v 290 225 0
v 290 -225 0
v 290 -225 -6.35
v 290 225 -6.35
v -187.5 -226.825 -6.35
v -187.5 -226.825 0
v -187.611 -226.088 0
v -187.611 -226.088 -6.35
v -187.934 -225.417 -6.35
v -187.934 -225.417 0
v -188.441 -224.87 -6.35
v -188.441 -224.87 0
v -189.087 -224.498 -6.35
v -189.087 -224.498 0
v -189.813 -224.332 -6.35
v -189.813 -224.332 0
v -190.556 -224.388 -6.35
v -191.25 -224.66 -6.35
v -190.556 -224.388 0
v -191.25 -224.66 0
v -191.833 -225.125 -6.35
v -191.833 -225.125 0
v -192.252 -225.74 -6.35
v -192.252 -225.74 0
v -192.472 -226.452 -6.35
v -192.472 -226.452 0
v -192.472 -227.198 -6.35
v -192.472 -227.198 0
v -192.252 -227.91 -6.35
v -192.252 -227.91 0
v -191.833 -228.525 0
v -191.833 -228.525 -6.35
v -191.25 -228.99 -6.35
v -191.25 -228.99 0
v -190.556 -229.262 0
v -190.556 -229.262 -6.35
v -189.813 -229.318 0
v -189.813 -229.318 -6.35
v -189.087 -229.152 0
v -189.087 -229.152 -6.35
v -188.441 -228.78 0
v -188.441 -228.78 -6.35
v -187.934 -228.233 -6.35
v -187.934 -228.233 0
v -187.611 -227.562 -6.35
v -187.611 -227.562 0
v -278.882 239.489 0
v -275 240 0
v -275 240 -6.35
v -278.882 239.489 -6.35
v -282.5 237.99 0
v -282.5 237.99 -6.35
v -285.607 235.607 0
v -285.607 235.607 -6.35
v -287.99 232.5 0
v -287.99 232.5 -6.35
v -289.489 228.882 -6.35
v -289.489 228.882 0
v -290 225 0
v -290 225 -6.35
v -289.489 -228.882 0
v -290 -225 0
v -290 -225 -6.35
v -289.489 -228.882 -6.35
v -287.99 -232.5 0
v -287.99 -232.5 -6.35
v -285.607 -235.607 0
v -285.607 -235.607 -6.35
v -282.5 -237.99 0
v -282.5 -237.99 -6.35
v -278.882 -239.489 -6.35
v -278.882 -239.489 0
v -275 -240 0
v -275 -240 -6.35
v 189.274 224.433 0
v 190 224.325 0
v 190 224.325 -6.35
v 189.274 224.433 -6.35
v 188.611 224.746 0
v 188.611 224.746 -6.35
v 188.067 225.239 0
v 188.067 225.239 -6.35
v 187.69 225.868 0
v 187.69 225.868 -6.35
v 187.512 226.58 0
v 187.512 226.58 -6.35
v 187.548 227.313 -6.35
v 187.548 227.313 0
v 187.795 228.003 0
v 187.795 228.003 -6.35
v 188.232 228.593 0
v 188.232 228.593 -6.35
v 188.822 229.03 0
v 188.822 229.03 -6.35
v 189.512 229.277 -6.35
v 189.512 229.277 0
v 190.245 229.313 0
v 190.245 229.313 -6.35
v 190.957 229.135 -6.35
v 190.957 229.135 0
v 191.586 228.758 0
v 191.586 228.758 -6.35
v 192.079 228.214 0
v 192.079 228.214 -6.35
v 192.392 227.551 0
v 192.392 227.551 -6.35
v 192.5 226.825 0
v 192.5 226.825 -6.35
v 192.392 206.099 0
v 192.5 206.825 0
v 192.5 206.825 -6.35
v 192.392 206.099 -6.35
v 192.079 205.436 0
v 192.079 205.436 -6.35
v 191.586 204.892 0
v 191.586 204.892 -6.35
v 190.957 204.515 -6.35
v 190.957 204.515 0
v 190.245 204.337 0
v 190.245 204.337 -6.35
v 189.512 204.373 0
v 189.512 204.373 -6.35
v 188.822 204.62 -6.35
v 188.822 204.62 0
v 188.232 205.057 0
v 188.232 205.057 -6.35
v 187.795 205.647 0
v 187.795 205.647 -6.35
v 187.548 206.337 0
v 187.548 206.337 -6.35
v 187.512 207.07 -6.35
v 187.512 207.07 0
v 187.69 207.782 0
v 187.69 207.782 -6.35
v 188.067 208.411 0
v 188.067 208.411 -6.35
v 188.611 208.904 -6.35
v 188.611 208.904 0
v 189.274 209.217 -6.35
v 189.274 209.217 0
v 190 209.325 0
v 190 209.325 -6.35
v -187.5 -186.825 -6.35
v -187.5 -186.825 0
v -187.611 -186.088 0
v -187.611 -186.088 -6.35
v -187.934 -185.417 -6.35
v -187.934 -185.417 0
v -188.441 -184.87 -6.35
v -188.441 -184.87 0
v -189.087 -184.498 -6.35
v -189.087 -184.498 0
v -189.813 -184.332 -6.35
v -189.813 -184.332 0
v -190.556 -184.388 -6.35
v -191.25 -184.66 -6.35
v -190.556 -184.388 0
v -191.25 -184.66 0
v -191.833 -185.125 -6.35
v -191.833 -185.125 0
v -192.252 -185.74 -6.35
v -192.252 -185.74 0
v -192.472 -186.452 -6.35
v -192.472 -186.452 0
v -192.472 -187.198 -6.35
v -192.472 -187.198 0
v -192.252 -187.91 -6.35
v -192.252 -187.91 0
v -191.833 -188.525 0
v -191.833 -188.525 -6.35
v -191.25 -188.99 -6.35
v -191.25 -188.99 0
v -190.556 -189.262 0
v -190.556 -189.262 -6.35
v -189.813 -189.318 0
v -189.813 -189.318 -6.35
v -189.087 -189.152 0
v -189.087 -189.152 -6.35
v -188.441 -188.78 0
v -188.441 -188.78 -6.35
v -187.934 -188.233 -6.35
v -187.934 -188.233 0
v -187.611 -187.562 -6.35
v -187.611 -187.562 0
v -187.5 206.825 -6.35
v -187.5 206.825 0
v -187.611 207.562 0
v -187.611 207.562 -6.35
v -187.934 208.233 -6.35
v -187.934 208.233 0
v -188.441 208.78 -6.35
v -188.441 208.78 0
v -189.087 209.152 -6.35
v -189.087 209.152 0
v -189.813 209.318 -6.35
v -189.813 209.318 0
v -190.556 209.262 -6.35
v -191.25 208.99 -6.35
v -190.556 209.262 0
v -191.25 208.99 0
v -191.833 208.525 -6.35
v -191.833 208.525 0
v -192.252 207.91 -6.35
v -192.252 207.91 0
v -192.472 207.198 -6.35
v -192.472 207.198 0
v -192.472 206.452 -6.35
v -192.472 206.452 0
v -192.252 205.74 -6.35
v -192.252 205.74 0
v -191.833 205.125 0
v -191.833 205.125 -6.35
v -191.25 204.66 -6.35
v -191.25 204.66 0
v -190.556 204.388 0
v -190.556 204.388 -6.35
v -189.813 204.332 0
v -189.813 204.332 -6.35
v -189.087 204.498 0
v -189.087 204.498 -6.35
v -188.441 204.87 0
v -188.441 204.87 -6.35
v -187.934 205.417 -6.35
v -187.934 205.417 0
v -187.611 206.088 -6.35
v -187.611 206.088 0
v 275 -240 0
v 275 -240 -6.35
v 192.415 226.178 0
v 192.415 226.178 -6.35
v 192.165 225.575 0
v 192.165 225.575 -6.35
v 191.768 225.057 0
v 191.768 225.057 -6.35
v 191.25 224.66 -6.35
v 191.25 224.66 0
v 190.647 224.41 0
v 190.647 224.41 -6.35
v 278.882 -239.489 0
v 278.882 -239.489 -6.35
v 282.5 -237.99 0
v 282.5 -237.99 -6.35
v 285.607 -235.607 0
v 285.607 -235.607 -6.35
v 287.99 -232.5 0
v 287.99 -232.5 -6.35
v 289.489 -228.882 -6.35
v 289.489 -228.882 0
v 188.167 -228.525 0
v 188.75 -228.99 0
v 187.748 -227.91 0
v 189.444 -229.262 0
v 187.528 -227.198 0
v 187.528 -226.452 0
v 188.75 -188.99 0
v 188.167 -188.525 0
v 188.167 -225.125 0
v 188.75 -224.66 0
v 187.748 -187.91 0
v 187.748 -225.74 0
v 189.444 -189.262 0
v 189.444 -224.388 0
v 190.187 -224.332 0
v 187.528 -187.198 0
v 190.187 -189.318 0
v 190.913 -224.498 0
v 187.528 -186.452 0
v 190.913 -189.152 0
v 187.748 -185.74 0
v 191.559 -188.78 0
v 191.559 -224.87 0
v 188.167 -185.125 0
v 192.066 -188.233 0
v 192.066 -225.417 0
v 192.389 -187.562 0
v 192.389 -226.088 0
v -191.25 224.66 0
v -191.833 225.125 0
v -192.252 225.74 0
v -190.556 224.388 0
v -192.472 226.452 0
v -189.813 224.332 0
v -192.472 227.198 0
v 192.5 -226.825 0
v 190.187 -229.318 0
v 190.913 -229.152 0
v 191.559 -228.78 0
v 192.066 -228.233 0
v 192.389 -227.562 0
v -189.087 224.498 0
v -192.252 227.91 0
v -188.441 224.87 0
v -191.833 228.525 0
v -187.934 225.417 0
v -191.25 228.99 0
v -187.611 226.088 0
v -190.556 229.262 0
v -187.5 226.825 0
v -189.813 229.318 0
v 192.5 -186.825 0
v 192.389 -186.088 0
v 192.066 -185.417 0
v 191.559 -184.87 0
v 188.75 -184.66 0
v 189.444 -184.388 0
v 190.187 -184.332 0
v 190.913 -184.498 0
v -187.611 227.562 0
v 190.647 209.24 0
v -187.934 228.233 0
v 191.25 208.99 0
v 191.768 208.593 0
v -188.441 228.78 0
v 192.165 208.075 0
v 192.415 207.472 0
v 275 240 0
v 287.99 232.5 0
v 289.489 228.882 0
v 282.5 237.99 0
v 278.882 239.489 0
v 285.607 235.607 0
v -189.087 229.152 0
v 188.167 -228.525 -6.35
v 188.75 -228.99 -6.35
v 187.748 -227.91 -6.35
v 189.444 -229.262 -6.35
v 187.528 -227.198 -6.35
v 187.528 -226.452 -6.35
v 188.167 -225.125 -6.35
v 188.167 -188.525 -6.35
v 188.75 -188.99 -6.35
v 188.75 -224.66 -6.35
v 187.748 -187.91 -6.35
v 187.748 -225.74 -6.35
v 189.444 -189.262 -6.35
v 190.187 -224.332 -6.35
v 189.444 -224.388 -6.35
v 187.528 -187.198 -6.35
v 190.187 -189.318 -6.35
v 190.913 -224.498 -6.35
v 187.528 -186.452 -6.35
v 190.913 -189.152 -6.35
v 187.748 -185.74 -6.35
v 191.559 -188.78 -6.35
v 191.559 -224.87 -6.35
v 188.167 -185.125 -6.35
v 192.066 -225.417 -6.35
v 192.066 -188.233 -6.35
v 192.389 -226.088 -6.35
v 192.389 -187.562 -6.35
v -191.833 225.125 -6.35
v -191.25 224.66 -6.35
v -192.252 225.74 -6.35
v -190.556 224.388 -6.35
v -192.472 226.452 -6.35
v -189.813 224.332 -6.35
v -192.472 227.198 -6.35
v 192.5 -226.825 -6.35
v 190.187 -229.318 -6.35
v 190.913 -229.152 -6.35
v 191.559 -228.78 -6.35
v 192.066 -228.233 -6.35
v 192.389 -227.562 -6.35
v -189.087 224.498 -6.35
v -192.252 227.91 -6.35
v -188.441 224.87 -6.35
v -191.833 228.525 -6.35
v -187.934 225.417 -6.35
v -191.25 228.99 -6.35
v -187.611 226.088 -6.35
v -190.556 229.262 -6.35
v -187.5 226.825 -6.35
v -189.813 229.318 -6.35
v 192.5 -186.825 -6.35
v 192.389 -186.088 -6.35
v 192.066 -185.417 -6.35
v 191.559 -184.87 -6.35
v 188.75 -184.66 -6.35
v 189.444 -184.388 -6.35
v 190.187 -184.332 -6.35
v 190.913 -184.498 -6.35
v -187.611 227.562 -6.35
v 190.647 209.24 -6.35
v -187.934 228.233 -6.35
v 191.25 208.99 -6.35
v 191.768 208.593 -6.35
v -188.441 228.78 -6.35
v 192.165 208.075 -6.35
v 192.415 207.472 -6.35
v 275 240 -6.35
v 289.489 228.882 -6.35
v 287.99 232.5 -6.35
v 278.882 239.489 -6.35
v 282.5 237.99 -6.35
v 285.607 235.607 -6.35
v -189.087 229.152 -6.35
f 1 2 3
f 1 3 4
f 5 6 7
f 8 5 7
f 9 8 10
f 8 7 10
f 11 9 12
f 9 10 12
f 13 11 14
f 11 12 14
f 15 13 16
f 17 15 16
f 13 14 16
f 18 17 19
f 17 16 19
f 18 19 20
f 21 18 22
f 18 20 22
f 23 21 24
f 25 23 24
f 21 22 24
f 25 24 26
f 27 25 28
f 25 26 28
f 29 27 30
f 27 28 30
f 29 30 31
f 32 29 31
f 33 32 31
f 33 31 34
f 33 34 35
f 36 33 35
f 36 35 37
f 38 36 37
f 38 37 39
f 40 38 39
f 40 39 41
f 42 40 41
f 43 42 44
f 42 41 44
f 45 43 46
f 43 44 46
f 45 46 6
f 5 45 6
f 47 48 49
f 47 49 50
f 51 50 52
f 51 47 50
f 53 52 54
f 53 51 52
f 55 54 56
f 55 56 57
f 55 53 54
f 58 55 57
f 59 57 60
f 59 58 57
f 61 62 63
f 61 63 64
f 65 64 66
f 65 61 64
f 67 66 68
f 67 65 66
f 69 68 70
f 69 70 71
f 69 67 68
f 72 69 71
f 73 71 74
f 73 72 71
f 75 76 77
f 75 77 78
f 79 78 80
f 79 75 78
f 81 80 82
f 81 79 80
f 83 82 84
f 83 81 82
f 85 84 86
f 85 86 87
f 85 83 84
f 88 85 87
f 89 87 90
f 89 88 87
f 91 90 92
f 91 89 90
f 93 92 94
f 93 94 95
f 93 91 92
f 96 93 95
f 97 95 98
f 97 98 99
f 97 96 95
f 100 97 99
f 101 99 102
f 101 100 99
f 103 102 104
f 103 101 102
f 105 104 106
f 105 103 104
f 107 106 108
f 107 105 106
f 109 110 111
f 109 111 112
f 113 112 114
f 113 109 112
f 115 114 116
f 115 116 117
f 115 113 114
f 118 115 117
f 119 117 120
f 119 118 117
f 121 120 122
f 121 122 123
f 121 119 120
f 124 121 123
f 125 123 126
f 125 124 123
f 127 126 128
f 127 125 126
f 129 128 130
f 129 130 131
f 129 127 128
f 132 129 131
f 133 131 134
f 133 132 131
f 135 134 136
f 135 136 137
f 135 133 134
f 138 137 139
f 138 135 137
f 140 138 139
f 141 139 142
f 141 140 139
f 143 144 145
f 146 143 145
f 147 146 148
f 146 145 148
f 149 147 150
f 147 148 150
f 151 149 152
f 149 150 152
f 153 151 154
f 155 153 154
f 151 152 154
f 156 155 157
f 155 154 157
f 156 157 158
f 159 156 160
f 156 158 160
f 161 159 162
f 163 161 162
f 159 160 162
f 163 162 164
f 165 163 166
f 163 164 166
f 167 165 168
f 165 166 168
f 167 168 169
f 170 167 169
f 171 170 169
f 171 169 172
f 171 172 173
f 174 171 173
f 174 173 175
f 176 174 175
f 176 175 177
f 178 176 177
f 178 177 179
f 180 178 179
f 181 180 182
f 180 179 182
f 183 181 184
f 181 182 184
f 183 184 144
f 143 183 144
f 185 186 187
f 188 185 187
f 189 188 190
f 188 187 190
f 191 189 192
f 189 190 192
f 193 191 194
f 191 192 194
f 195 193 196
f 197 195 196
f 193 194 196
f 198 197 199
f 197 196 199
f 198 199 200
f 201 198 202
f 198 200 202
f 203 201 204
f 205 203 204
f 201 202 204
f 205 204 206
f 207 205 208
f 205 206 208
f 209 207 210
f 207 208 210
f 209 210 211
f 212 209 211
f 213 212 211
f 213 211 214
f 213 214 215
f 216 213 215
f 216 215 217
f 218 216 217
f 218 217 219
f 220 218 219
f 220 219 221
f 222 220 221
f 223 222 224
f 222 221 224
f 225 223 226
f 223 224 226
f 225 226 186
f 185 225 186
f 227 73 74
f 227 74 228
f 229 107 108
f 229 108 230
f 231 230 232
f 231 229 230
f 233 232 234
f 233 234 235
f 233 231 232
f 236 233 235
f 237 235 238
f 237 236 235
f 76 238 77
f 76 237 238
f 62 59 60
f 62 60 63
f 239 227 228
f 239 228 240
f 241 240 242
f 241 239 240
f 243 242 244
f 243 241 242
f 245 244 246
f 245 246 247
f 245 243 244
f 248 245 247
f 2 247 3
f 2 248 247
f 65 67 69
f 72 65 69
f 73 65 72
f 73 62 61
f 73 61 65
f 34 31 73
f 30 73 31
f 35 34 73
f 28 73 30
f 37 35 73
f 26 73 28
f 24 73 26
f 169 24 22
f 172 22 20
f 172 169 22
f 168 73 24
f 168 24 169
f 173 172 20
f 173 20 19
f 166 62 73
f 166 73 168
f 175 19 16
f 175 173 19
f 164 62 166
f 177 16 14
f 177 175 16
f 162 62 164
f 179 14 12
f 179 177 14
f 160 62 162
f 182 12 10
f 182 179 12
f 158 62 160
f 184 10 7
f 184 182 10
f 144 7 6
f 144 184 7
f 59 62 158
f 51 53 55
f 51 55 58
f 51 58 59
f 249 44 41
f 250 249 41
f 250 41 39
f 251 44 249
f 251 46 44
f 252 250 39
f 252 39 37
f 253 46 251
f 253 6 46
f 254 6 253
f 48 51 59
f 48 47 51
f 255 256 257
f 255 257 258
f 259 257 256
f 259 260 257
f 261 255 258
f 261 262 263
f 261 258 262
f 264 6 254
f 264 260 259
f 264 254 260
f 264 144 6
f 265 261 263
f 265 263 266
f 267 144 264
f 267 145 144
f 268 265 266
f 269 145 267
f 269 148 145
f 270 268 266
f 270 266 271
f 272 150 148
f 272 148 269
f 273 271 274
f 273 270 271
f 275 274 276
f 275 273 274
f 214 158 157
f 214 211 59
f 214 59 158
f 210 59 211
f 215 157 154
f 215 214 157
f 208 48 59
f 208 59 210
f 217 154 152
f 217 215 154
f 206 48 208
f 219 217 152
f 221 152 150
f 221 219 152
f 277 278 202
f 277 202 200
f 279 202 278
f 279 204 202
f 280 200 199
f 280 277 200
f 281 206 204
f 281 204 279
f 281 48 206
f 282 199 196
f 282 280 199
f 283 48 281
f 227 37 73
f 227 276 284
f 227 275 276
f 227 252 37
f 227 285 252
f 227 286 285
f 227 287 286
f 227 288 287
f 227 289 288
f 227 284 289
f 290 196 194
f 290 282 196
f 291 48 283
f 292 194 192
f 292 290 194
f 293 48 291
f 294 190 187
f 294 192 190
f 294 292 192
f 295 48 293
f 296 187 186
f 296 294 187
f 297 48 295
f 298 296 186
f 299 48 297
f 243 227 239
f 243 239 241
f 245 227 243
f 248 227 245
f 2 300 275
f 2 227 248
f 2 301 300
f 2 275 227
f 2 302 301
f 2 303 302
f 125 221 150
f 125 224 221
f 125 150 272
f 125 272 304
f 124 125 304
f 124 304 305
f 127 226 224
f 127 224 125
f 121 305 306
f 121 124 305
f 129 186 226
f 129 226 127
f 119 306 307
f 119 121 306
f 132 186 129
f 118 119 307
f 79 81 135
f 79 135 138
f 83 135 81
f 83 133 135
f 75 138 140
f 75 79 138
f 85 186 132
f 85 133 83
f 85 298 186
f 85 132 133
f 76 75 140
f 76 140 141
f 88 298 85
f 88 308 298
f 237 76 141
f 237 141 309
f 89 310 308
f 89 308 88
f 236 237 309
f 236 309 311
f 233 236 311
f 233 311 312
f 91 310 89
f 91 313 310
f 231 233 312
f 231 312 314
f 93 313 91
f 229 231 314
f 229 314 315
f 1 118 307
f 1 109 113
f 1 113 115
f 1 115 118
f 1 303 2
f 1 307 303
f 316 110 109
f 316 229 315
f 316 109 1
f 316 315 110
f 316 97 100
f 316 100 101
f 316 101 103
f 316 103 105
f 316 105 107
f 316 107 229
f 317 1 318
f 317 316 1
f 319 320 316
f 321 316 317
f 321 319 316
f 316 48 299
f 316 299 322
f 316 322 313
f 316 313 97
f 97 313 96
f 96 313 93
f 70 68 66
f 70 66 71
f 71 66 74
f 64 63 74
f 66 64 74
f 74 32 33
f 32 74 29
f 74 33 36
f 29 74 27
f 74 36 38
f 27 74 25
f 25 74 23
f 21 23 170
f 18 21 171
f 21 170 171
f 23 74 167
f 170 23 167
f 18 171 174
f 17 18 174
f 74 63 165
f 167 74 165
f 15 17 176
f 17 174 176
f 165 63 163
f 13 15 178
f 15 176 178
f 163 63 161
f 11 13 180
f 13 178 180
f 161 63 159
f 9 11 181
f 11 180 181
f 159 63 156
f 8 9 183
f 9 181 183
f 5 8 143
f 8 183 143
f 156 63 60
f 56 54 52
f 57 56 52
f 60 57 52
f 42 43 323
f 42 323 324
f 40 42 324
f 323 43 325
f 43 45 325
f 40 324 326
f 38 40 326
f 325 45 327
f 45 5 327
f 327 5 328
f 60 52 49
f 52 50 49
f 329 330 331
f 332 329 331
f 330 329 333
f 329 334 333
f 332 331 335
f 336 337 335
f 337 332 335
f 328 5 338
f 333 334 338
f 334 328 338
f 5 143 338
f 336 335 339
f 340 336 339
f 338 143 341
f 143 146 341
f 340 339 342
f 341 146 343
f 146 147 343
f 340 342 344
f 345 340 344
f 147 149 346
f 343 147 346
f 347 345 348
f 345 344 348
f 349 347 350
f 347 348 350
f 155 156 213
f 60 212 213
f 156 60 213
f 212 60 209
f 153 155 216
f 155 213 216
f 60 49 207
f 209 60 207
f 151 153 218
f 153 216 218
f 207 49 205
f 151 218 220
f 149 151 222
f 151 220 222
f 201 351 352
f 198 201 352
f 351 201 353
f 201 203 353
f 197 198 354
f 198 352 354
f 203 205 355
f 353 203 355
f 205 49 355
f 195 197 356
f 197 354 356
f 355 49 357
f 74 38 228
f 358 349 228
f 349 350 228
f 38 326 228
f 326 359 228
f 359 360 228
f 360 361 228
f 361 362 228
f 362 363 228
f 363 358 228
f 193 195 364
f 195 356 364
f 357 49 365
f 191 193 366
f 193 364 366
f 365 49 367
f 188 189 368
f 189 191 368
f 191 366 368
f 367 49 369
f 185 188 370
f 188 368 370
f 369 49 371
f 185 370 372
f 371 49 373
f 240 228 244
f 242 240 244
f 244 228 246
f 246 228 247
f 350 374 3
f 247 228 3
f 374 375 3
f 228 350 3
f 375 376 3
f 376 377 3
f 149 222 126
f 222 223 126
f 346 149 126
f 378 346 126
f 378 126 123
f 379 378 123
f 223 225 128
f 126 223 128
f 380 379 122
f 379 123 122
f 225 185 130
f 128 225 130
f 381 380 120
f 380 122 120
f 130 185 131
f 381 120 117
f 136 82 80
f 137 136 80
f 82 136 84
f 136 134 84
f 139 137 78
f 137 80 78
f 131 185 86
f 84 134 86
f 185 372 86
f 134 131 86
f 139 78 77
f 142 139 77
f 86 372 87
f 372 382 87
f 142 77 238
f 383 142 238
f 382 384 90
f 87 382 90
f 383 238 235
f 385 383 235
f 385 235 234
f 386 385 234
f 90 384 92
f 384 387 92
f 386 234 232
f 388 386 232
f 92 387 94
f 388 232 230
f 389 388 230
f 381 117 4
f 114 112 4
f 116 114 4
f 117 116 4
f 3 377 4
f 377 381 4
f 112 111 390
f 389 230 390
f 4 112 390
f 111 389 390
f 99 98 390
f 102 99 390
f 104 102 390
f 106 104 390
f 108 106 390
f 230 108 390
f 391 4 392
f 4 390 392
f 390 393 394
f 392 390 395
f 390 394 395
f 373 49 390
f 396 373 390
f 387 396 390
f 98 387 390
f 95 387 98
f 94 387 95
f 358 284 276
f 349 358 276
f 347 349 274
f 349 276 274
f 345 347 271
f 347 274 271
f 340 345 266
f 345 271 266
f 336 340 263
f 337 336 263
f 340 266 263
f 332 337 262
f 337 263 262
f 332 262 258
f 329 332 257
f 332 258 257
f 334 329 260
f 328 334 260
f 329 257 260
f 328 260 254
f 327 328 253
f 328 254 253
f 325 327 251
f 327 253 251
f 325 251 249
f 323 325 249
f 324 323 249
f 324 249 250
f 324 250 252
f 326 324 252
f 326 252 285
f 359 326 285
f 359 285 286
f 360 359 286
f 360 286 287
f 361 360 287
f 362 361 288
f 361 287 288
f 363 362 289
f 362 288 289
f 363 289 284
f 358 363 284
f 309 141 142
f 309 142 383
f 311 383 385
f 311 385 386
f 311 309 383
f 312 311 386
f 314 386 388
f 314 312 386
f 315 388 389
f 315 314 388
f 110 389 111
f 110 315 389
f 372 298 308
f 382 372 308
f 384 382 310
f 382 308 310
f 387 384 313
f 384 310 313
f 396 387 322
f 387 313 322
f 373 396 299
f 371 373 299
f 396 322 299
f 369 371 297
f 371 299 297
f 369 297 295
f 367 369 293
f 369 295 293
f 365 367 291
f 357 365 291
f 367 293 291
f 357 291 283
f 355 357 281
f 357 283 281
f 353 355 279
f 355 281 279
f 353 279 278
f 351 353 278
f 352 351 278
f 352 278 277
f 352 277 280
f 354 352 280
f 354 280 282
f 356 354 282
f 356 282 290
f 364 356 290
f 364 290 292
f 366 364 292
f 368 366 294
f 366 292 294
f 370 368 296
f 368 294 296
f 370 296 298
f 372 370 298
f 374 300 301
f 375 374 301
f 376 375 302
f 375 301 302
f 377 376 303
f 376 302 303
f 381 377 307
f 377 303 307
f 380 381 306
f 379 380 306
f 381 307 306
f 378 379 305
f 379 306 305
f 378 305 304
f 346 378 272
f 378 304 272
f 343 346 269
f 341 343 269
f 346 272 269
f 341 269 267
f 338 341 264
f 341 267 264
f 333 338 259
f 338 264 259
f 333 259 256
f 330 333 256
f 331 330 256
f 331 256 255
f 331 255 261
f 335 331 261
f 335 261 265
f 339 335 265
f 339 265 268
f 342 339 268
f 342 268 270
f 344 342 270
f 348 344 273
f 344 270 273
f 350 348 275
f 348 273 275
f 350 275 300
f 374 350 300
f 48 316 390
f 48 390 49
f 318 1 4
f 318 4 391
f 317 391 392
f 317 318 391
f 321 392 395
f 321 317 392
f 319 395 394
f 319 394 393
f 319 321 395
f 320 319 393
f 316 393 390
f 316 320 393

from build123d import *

# Parameters (mm, degrees)
F0_R     = 2.5
F1_DEPTH = 6.35


# Not quite as in the source:
# - a length typed as a fraction of an inch, garbled in the dataset ("3 / 203.2 mm" for 3/8 in), is restored


with BuildPart() as f1:
    # F0 (on Top) → F1 (new body)
    with BuildSketch(Plane.XY):
        with BuildLine():
            Line((-275, -240), (275, -240))
            ThreePointArc((275, -240), (285.6066017178, -235.6066017178), (290, -225))
            Line((290, -225), (290, 225))
            ThreePointArc((290, 225), (285.6066017178, 235.6066017178), (275, 240))
            Line((275, 240), (-275, 240))
            ThreePointArc((-275, 240), (-285.6066017178, 235.6066017178), (-290, 225))
            Line((-290, 225), (-290, -225))
            ThreePointArc((-290, -225), (-285.6066017178, -235.6066017178), (-275, -240))
        make_face()
        with Locations((-190, -226.825)):
            Circle(F0_R, mode=Mode.SUBTRACT)
        with Locations((-190, -186.825)):
            Circle(F0_R, mode=Mode.SUBTRACT)
        with Locations((190, -226.825)):
            Circle(F0_R, mode=Mode.SUBTRACT)
        with Locations((190, -186.825)):
            Circle(F0_R, mode=Mode.SUBTRACT)
        with Locations((-190, 206.825)):
            Circle(F0_R, mode=Mode.SUBTRACT)
        with Locations((-190, 226.825)):
            Circle(F0_R, mode=Mode.SUBTRACT)
        with BuildLine():
            ThreePointArc((190, 209.325), (191.767766953, 208.592766953), (192.5, 206.825))
            ThreePointArc((192.5, 206.825), (188.232233047, 205.057233047), (190, 209.325))
        make_face(mode=Mode.SUBTRACT)
        with BuildLine():
            ThreePointArc((192.5, 226.825), (191.767766953, 225.057233047), (190, 224.325))
            ThreePointArc((190, 224.325), (188.232233047, 228.592766953), (192.5, 226.825))
        make_face(mode=Mode.SUBTRACT)
    extrude(amount=-F1_DEPTH)


solid = f1.part
